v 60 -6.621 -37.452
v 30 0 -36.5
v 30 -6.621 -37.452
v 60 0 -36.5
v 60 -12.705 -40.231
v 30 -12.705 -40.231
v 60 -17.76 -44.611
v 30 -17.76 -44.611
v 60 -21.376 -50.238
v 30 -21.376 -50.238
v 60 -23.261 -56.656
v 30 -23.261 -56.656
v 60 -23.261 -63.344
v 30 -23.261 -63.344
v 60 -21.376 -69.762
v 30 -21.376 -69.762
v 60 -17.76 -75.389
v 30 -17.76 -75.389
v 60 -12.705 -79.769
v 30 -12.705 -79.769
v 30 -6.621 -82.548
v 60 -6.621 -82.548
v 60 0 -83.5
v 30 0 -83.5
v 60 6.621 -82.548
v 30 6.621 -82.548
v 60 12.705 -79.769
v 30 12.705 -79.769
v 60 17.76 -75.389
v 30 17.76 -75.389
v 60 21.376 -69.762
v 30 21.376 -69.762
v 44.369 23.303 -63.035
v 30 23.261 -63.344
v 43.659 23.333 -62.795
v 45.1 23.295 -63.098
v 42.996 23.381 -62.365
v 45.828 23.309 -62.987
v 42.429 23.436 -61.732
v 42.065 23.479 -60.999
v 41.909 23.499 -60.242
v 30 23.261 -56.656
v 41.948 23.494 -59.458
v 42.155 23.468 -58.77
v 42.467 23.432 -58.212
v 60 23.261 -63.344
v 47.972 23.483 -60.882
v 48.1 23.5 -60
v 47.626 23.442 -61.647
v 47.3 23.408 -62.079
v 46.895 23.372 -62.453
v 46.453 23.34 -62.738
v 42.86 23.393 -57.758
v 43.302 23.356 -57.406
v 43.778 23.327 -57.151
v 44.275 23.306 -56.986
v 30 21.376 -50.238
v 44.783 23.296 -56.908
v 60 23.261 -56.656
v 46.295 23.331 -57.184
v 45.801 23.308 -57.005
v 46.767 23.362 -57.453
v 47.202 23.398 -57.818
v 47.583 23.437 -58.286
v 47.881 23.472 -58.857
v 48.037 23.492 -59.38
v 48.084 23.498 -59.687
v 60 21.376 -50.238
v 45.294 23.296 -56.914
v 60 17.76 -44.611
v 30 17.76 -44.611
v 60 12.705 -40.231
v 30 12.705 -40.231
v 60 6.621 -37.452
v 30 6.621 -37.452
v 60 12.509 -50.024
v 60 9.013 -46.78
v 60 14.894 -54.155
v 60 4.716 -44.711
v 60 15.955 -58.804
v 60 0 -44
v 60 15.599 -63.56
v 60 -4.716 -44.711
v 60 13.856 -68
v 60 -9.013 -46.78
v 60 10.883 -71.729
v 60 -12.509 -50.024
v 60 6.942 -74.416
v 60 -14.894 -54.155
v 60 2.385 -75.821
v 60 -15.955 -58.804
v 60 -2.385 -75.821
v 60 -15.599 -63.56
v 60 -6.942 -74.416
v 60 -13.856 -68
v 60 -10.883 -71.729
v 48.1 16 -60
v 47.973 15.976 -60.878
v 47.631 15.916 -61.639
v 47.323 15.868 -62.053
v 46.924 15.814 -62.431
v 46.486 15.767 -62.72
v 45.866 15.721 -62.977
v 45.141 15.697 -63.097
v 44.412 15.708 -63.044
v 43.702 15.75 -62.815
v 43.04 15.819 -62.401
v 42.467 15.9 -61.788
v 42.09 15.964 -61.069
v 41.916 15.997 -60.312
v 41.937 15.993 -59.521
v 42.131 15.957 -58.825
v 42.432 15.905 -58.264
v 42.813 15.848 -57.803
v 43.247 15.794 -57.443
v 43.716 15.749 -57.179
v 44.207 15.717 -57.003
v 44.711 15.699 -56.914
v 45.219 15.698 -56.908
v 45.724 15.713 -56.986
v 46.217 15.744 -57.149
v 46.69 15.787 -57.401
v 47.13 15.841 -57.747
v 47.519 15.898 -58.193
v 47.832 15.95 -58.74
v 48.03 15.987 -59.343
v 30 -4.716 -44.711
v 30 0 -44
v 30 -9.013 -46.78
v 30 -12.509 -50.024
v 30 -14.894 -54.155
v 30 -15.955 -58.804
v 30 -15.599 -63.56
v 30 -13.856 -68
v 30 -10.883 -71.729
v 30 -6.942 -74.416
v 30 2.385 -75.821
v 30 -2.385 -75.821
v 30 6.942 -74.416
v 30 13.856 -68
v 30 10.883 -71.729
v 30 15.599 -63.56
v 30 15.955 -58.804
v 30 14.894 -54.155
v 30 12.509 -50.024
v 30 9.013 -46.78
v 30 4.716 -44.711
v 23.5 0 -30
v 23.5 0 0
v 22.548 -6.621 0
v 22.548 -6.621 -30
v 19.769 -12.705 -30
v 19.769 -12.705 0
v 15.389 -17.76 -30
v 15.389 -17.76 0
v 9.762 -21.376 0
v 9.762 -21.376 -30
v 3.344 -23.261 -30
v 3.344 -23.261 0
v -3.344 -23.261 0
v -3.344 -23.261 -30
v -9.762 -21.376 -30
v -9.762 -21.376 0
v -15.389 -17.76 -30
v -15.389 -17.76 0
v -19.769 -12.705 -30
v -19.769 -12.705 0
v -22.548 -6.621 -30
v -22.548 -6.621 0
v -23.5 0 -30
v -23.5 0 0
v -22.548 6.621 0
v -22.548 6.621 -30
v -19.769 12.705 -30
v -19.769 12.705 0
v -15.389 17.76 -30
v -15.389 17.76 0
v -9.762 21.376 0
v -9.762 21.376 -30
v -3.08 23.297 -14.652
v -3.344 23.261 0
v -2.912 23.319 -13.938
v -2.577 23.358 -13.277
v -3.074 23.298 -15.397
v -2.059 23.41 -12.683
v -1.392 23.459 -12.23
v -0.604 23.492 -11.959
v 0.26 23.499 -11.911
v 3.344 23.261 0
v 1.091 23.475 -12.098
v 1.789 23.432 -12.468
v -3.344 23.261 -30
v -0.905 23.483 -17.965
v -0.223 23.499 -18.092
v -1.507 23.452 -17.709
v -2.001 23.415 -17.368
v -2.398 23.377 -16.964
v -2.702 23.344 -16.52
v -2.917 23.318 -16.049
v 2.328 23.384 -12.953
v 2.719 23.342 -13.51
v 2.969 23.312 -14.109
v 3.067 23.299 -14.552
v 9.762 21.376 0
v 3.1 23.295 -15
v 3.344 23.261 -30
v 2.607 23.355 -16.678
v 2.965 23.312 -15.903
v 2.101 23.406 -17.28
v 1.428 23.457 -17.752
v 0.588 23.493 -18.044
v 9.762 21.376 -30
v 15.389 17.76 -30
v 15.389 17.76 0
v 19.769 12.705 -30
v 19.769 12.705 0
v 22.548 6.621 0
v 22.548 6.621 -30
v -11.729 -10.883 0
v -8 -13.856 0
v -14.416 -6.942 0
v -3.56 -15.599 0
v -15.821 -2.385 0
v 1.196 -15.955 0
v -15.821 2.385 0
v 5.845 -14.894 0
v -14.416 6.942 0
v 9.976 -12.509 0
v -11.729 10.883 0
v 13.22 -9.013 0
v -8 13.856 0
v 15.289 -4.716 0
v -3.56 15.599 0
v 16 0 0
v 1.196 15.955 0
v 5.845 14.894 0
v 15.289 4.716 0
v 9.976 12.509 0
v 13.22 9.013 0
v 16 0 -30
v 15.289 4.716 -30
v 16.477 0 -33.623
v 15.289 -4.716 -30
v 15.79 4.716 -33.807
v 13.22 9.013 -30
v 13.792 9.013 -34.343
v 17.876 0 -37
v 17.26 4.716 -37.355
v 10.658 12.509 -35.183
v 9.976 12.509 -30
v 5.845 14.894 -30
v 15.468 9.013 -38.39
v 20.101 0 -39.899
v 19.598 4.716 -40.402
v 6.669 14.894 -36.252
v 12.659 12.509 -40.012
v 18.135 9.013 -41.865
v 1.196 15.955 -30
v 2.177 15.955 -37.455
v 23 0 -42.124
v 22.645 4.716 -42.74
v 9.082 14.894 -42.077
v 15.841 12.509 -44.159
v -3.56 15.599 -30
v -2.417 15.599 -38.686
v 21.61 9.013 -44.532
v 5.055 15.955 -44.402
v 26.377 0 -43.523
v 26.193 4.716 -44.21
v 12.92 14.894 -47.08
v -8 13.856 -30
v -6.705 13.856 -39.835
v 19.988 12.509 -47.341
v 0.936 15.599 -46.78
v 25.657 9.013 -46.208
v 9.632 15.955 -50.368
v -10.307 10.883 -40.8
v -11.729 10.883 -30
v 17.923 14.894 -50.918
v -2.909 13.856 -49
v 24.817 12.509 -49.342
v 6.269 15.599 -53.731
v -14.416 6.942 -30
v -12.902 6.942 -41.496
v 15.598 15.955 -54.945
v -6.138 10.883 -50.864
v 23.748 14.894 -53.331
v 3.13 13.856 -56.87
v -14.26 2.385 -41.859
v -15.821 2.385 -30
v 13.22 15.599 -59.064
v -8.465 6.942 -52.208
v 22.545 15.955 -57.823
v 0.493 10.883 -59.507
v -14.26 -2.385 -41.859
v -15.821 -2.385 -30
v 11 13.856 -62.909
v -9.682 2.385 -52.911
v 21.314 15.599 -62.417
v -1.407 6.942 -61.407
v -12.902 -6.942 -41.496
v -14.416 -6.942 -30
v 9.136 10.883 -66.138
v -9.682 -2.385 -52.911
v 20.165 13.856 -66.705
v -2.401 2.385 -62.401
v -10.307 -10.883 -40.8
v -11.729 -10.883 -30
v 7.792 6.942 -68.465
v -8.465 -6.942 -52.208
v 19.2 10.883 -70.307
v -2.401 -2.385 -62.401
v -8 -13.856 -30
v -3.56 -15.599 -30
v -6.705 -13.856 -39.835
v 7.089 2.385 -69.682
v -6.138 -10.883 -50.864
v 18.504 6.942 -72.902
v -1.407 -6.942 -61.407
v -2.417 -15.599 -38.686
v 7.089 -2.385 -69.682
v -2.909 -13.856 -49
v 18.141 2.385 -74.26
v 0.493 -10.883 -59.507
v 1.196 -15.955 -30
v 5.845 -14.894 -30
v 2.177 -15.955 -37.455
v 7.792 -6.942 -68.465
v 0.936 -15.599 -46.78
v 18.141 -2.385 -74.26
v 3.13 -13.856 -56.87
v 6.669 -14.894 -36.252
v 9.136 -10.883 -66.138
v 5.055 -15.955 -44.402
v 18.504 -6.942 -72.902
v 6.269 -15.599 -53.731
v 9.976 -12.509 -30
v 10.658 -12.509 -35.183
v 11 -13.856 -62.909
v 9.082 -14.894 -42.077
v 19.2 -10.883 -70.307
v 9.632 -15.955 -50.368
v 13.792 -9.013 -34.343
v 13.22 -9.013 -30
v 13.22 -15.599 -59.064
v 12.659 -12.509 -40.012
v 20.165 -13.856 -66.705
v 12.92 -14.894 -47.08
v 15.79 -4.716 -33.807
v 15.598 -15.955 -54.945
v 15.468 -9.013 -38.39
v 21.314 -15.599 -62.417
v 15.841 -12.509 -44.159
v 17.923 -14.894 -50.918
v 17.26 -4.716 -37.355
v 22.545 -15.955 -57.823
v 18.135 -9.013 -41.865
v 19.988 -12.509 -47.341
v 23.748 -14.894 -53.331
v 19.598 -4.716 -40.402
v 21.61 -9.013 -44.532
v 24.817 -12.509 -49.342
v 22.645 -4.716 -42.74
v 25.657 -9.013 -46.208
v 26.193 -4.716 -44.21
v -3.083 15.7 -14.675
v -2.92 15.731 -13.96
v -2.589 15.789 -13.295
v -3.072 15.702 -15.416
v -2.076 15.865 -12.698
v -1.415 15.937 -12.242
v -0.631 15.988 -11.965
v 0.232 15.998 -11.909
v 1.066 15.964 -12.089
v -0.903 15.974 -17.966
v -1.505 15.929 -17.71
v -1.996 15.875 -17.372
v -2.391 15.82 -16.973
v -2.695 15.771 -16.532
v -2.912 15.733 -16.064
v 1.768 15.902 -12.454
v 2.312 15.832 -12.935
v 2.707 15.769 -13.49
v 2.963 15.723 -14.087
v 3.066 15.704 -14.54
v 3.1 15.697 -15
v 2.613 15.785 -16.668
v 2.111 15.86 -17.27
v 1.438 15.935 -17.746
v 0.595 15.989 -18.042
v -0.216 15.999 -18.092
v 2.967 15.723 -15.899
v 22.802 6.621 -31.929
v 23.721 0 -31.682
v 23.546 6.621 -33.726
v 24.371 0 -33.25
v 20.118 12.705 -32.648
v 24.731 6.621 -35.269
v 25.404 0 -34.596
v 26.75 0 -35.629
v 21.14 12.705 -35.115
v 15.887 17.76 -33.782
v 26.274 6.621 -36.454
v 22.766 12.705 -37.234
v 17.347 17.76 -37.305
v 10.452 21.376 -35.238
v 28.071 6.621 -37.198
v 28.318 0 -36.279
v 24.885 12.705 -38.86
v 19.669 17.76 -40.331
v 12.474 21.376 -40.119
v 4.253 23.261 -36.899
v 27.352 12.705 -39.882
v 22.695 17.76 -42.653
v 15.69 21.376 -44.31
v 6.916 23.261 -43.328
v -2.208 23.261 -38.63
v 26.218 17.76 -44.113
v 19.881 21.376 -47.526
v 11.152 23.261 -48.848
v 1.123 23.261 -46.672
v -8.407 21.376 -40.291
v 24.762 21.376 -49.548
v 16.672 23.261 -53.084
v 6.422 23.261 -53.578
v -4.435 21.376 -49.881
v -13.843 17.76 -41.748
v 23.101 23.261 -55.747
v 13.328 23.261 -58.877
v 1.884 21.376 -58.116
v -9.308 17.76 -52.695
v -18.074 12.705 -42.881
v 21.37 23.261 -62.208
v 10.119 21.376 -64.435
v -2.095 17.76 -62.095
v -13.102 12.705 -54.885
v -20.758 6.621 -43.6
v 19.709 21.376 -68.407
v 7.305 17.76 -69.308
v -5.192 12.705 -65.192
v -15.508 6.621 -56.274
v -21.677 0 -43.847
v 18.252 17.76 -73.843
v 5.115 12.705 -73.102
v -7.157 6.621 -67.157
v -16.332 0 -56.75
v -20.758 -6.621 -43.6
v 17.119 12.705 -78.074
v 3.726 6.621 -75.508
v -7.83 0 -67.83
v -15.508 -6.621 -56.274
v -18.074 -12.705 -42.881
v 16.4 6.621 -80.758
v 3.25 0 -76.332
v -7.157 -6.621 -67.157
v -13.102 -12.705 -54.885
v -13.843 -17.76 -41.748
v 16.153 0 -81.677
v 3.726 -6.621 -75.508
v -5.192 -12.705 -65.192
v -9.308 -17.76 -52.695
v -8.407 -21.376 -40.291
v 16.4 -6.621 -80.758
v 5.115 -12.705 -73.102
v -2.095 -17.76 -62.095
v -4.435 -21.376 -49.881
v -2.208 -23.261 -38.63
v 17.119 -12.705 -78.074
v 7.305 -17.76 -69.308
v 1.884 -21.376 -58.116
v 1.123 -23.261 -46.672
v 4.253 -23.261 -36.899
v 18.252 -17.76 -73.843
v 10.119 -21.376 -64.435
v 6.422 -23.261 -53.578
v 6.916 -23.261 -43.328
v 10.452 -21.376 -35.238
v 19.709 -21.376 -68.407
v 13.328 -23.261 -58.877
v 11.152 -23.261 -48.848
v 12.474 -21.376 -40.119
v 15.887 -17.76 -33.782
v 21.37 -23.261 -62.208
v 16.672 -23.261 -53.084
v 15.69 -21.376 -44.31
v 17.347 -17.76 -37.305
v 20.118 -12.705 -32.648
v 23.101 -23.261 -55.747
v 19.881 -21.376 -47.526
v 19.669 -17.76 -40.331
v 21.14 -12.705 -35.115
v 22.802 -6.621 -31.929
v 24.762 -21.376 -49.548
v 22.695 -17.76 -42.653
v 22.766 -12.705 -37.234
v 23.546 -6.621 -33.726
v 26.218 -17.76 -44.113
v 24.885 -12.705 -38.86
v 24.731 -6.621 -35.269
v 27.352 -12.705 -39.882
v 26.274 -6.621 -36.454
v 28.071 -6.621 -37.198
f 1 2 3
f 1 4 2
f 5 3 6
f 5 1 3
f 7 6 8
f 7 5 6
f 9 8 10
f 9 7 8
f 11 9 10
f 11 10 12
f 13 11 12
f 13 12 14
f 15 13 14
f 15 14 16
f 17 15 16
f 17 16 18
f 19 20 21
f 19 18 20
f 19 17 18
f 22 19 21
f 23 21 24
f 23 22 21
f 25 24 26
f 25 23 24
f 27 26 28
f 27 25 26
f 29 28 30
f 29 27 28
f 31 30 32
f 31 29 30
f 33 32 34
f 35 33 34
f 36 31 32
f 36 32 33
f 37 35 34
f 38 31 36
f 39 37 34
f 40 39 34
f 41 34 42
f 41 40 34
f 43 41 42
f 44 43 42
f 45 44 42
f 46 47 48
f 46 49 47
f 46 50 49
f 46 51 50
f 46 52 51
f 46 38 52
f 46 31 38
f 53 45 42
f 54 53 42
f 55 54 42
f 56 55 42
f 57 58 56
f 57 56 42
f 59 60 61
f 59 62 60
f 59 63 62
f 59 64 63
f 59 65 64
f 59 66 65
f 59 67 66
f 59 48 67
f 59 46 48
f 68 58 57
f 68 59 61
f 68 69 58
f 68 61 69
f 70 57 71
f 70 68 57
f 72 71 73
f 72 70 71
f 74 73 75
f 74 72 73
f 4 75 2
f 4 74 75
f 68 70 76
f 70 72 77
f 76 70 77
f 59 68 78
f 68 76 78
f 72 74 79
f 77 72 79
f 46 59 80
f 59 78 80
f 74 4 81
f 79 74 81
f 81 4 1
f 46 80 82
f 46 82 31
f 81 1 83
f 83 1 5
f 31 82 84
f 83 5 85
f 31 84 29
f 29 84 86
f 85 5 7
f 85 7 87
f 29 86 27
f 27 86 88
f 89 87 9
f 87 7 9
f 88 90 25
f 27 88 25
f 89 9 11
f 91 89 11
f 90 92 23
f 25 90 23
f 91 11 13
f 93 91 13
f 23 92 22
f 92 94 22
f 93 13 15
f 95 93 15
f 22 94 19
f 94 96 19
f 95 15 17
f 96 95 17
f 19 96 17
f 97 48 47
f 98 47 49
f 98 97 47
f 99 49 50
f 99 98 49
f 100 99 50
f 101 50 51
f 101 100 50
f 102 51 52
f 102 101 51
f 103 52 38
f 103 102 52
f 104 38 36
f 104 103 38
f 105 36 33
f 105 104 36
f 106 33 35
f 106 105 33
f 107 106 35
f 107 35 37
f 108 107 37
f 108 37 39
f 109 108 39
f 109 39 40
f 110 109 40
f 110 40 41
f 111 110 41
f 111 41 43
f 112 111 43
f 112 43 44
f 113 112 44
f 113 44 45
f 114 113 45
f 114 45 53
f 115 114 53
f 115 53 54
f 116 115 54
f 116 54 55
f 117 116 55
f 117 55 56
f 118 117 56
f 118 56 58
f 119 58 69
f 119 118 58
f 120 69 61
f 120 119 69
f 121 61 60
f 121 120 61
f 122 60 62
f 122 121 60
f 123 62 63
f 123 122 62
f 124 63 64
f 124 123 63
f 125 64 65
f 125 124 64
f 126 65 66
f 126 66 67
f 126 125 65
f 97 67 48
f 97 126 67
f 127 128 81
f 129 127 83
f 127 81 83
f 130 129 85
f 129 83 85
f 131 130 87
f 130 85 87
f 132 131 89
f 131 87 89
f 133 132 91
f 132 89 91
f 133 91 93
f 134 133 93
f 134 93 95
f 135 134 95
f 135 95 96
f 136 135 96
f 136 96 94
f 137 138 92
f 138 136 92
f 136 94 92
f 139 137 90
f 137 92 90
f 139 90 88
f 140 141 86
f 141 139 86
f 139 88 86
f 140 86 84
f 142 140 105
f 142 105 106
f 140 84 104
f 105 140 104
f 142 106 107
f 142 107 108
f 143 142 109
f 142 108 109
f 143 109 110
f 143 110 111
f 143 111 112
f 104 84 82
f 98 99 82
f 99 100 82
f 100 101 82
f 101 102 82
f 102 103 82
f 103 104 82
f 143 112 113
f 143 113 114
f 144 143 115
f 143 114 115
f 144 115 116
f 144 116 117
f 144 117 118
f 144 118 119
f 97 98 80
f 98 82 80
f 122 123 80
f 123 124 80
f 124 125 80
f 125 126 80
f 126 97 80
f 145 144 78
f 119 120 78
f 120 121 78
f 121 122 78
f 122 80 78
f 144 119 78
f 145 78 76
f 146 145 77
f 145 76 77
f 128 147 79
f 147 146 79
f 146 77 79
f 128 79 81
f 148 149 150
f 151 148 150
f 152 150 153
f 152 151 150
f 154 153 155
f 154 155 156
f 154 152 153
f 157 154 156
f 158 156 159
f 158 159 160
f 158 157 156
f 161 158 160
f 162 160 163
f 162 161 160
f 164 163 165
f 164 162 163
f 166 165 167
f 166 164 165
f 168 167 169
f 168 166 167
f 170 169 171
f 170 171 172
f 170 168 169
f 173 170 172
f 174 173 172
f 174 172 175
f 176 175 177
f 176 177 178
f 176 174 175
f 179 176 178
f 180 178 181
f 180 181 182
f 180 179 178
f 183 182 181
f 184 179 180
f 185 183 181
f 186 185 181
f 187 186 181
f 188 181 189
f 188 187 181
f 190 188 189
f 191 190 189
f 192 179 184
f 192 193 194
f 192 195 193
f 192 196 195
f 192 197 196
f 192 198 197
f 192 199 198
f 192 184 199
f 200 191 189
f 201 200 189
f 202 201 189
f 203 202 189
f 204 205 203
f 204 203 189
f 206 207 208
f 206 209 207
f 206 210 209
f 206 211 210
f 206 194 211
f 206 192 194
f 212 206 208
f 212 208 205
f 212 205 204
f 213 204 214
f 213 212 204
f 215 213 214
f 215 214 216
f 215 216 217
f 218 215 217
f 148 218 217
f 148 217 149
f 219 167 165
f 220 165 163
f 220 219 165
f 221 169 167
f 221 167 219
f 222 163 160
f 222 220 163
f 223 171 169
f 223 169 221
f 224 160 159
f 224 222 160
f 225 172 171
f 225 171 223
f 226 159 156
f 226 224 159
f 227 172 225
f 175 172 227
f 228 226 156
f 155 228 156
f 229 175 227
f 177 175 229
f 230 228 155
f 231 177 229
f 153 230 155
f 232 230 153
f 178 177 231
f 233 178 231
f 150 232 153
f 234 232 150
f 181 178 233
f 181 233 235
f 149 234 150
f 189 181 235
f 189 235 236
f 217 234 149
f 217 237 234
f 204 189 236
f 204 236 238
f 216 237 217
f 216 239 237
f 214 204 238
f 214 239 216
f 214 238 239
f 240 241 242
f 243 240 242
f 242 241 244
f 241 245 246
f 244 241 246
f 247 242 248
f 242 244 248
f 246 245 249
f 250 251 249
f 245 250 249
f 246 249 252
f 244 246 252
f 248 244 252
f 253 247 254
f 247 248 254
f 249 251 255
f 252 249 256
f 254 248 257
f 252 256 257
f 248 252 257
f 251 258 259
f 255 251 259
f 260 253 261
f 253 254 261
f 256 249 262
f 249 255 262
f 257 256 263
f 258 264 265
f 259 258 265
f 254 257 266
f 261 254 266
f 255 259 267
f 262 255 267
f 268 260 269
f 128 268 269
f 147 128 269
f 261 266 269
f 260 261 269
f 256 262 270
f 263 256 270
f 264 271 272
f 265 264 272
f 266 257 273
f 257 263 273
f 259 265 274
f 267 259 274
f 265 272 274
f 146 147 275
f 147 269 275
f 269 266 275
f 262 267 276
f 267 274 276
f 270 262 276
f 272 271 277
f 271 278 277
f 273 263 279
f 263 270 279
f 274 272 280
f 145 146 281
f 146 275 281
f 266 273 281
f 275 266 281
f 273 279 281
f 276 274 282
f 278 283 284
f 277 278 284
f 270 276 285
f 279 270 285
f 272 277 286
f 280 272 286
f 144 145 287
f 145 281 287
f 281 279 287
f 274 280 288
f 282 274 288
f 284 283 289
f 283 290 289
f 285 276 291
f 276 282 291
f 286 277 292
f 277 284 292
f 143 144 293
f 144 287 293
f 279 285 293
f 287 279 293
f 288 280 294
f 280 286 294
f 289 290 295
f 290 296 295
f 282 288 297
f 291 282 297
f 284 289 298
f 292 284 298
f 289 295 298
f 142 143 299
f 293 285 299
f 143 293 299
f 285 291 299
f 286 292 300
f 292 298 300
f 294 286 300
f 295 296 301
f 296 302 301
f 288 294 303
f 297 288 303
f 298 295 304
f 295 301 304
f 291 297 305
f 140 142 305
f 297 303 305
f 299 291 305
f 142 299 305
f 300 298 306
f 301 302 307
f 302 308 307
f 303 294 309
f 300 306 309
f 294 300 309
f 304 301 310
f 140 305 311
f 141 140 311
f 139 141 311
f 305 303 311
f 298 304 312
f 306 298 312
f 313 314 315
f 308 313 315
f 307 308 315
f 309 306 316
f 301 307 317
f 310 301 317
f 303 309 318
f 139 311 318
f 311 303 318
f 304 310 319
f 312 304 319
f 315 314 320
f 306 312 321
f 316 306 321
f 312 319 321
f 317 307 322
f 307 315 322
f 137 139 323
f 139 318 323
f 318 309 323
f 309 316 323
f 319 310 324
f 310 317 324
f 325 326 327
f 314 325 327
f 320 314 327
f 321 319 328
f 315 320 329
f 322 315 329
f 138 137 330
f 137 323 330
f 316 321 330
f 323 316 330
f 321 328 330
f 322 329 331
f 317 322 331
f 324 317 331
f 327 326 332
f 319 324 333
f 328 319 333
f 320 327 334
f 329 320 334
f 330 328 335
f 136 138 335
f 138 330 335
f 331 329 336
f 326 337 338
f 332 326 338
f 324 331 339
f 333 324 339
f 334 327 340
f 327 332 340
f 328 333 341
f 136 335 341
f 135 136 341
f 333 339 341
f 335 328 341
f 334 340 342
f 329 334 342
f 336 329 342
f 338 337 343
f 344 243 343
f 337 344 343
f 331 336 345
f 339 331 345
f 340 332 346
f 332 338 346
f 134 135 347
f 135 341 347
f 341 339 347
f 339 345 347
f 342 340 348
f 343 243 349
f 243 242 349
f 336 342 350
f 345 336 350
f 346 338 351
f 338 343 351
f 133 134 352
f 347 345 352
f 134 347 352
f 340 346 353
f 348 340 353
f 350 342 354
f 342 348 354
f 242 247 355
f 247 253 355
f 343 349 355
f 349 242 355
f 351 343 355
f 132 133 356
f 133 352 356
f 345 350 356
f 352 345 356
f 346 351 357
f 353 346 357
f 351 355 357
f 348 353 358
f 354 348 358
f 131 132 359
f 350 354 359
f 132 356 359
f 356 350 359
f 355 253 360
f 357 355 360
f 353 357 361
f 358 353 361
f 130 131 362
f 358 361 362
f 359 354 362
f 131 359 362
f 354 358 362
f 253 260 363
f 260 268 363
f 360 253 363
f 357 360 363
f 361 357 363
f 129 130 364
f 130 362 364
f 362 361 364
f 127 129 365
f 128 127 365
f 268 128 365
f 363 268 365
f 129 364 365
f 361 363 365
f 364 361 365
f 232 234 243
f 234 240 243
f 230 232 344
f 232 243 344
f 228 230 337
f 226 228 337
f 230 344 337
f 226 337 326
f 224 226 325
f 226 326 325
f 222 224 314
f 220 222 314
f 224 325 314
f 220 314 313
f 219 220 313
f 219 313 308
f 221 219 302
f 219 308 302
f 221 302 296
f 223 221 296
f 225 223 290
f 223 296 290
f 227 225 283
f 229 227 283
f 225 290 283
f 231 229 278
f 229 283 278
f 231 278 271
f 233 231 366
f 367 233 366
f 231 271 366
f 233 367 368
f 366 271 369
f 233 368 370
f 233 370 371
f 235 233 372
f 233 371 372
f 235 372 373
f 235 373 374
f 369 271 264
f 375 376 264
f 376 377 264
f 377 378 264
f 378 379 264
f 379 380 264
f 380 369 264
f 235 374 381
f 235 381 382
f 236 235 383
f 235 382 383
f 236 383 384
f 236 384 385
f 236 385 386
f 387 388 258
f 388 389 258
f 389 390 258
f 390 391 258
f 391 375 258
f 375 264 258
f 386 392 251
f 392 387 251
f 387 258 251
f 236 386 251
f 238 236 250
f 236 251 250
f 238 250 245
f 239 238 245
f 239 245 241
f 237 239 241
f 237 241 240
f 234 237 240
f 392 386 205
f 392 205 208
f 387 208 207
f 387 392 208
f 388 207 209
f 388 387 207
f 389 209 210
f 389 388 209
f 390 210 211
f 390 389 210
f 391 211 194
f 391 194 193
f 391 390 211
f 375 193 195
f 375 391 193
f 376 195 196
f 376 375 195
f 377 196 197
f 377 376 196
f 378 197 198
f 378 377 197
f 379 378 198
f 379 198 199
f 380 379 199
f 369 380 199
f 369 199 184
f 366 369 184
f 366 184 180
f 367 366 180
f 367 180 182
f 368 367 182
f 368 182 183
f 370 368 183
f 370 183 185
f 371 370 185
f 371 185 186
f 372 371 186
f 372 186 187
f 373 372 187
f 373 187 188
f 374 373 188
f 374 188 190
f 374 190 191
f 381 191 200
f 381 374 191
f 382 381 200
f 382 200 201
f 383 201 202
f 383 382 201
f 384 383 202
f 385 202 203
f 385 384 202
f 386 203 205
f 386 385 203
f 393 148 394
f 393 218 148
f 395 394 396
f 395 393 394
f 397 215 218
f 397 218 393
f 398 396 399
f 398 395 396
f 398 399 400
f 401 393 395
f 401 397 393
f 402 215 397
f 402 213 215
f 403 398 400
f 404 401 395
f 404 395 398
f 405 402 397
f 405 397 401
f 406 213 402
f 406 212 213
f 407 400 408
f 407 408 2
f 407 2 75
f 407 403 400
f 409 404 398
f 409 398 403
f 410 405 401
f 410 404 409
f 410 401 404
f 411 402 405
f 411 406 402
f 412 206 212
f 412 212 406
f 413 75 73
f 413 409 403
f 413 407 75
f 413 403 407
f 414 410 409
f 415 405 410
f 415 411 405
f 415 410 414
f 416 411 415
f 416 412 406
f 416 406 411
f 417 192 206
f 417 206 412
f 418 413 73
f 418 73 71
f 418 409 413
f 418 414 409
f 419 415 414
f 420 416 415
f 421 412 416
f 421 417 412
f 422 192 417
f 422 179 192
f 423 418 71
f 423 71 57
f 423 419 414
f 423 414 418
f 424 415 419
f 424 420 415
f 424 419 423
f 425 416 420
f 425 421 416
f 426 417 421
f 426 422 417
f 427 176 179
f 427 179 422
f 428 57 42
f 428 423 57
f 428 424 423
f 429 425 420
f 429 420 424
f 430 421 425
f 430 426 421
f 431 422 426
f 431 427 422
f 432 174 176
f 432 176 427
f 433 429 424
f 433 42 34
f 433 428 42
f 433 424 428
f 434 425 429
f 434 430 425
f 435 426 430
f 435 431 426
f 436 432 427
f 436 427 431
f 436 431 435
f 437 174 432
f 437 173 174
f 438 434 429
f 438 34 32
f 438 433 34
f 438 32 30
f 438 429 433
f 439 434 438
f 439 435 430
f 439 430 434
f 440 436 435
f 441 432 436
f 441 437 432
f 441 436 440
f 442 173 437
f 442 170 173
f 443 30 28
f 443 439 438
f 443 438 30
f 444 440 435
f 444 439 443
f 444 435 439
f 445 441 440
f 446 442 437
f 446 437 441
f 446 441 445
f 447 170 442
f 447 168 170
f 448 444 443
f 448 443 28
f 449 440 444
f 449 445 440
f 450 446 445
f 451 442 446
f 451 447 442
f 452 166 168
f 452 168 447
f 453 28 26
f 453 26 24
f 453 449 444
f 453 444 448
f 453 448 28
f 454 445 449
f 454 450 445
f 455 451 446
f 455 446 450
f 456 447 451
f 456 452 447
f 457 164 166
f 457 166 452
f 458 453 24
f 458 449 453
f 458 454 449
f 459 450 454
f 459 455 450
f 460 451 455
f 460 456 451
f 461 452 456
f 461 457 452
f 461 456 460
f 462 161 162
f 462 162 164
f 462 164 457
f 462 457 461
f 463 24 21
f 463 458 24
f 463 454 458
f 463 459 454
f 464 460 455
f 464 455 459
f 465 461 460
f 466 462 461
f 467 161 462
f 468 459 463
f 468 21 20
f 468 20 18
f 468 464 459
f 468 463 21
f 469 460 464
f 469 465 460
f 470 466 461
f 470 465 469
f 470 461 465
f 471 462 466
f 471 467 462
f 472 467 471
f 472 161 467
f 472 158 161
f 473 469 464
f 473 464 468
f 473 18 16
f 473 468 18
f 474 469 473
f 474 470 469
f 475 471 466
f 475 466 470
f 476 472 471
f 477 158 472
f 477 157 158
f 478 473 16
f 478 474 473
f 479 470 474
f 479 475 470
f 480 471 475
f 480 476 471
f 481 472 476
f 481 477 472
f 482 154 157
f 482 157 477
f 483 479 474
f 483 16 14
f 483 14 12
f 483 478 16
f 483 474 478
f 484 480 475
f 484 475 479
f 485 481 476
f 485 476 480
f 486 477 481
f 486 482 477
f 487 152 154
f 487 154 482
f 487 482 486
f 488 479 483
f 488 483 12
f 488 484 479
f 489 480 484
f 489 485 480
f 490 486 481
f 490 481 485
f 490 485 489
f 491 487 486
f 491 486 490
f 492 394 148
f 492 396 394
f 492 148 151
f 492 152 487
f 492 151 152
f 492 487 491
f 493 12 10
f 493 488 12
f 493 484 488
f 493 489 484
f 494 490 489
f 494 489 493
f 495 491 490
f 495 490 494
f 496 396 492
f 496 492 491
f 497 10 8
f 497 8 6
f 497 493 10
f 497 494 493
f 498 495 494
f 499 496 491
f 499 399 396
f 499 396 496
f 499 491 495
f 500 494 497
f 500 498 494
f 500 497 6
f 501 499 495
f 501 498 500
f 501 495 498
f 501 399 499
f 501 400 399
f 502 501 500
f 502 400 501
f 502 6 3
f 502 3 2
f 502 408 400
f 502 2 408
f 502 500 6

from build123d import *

# Parameters (mm, degrees)
SKETCH2_R          = 23.5
SKETCH2_R_2        = 16
SKETCH3_R          = 3.1
CUT_EXTRUDE1_DEPTH = 40


with BuildPart() as part:
    # Sweep8: sweep along a path in Sketch1
    with BuildLine(Plane(origin=(0, 0, 0), x_dir=(1, 0, 0), z_dir=(0, 1, 0))) as sweep8_path:
        Line((0, 0), (0, 30))
        ThreePointArc((0, 30), (8.786796564, 51.213203436), (30, 60))
        Line((30, 60), (60, 60))
    # Sketch2 → Sweep8 (sweep)
    with BuildSketch(Plane.XY):
        Circle(SKETCH2_R)
        Circle(SKETCH2_R_2, mode=Mode.SUBTRACT)
    sweep(path=sweep8_path.line)

    # Sketch3 → Cut-Extrude1 (cut)
    with BuildSketch(Plane(origin=(0, 0, 0), x_dir=(1, 0, 0), z_dir=(0, 1, 0))):
        with Locations((0, 15)):
            Circle(SKETCH3_R)
        with Locations((45, 60)):
            Circle(SKETCH3_R)
    extrude(amount=CUT_EXTRUDE1_DEPTH, mode=Mode.SUBTRACT)


solid = part.part
